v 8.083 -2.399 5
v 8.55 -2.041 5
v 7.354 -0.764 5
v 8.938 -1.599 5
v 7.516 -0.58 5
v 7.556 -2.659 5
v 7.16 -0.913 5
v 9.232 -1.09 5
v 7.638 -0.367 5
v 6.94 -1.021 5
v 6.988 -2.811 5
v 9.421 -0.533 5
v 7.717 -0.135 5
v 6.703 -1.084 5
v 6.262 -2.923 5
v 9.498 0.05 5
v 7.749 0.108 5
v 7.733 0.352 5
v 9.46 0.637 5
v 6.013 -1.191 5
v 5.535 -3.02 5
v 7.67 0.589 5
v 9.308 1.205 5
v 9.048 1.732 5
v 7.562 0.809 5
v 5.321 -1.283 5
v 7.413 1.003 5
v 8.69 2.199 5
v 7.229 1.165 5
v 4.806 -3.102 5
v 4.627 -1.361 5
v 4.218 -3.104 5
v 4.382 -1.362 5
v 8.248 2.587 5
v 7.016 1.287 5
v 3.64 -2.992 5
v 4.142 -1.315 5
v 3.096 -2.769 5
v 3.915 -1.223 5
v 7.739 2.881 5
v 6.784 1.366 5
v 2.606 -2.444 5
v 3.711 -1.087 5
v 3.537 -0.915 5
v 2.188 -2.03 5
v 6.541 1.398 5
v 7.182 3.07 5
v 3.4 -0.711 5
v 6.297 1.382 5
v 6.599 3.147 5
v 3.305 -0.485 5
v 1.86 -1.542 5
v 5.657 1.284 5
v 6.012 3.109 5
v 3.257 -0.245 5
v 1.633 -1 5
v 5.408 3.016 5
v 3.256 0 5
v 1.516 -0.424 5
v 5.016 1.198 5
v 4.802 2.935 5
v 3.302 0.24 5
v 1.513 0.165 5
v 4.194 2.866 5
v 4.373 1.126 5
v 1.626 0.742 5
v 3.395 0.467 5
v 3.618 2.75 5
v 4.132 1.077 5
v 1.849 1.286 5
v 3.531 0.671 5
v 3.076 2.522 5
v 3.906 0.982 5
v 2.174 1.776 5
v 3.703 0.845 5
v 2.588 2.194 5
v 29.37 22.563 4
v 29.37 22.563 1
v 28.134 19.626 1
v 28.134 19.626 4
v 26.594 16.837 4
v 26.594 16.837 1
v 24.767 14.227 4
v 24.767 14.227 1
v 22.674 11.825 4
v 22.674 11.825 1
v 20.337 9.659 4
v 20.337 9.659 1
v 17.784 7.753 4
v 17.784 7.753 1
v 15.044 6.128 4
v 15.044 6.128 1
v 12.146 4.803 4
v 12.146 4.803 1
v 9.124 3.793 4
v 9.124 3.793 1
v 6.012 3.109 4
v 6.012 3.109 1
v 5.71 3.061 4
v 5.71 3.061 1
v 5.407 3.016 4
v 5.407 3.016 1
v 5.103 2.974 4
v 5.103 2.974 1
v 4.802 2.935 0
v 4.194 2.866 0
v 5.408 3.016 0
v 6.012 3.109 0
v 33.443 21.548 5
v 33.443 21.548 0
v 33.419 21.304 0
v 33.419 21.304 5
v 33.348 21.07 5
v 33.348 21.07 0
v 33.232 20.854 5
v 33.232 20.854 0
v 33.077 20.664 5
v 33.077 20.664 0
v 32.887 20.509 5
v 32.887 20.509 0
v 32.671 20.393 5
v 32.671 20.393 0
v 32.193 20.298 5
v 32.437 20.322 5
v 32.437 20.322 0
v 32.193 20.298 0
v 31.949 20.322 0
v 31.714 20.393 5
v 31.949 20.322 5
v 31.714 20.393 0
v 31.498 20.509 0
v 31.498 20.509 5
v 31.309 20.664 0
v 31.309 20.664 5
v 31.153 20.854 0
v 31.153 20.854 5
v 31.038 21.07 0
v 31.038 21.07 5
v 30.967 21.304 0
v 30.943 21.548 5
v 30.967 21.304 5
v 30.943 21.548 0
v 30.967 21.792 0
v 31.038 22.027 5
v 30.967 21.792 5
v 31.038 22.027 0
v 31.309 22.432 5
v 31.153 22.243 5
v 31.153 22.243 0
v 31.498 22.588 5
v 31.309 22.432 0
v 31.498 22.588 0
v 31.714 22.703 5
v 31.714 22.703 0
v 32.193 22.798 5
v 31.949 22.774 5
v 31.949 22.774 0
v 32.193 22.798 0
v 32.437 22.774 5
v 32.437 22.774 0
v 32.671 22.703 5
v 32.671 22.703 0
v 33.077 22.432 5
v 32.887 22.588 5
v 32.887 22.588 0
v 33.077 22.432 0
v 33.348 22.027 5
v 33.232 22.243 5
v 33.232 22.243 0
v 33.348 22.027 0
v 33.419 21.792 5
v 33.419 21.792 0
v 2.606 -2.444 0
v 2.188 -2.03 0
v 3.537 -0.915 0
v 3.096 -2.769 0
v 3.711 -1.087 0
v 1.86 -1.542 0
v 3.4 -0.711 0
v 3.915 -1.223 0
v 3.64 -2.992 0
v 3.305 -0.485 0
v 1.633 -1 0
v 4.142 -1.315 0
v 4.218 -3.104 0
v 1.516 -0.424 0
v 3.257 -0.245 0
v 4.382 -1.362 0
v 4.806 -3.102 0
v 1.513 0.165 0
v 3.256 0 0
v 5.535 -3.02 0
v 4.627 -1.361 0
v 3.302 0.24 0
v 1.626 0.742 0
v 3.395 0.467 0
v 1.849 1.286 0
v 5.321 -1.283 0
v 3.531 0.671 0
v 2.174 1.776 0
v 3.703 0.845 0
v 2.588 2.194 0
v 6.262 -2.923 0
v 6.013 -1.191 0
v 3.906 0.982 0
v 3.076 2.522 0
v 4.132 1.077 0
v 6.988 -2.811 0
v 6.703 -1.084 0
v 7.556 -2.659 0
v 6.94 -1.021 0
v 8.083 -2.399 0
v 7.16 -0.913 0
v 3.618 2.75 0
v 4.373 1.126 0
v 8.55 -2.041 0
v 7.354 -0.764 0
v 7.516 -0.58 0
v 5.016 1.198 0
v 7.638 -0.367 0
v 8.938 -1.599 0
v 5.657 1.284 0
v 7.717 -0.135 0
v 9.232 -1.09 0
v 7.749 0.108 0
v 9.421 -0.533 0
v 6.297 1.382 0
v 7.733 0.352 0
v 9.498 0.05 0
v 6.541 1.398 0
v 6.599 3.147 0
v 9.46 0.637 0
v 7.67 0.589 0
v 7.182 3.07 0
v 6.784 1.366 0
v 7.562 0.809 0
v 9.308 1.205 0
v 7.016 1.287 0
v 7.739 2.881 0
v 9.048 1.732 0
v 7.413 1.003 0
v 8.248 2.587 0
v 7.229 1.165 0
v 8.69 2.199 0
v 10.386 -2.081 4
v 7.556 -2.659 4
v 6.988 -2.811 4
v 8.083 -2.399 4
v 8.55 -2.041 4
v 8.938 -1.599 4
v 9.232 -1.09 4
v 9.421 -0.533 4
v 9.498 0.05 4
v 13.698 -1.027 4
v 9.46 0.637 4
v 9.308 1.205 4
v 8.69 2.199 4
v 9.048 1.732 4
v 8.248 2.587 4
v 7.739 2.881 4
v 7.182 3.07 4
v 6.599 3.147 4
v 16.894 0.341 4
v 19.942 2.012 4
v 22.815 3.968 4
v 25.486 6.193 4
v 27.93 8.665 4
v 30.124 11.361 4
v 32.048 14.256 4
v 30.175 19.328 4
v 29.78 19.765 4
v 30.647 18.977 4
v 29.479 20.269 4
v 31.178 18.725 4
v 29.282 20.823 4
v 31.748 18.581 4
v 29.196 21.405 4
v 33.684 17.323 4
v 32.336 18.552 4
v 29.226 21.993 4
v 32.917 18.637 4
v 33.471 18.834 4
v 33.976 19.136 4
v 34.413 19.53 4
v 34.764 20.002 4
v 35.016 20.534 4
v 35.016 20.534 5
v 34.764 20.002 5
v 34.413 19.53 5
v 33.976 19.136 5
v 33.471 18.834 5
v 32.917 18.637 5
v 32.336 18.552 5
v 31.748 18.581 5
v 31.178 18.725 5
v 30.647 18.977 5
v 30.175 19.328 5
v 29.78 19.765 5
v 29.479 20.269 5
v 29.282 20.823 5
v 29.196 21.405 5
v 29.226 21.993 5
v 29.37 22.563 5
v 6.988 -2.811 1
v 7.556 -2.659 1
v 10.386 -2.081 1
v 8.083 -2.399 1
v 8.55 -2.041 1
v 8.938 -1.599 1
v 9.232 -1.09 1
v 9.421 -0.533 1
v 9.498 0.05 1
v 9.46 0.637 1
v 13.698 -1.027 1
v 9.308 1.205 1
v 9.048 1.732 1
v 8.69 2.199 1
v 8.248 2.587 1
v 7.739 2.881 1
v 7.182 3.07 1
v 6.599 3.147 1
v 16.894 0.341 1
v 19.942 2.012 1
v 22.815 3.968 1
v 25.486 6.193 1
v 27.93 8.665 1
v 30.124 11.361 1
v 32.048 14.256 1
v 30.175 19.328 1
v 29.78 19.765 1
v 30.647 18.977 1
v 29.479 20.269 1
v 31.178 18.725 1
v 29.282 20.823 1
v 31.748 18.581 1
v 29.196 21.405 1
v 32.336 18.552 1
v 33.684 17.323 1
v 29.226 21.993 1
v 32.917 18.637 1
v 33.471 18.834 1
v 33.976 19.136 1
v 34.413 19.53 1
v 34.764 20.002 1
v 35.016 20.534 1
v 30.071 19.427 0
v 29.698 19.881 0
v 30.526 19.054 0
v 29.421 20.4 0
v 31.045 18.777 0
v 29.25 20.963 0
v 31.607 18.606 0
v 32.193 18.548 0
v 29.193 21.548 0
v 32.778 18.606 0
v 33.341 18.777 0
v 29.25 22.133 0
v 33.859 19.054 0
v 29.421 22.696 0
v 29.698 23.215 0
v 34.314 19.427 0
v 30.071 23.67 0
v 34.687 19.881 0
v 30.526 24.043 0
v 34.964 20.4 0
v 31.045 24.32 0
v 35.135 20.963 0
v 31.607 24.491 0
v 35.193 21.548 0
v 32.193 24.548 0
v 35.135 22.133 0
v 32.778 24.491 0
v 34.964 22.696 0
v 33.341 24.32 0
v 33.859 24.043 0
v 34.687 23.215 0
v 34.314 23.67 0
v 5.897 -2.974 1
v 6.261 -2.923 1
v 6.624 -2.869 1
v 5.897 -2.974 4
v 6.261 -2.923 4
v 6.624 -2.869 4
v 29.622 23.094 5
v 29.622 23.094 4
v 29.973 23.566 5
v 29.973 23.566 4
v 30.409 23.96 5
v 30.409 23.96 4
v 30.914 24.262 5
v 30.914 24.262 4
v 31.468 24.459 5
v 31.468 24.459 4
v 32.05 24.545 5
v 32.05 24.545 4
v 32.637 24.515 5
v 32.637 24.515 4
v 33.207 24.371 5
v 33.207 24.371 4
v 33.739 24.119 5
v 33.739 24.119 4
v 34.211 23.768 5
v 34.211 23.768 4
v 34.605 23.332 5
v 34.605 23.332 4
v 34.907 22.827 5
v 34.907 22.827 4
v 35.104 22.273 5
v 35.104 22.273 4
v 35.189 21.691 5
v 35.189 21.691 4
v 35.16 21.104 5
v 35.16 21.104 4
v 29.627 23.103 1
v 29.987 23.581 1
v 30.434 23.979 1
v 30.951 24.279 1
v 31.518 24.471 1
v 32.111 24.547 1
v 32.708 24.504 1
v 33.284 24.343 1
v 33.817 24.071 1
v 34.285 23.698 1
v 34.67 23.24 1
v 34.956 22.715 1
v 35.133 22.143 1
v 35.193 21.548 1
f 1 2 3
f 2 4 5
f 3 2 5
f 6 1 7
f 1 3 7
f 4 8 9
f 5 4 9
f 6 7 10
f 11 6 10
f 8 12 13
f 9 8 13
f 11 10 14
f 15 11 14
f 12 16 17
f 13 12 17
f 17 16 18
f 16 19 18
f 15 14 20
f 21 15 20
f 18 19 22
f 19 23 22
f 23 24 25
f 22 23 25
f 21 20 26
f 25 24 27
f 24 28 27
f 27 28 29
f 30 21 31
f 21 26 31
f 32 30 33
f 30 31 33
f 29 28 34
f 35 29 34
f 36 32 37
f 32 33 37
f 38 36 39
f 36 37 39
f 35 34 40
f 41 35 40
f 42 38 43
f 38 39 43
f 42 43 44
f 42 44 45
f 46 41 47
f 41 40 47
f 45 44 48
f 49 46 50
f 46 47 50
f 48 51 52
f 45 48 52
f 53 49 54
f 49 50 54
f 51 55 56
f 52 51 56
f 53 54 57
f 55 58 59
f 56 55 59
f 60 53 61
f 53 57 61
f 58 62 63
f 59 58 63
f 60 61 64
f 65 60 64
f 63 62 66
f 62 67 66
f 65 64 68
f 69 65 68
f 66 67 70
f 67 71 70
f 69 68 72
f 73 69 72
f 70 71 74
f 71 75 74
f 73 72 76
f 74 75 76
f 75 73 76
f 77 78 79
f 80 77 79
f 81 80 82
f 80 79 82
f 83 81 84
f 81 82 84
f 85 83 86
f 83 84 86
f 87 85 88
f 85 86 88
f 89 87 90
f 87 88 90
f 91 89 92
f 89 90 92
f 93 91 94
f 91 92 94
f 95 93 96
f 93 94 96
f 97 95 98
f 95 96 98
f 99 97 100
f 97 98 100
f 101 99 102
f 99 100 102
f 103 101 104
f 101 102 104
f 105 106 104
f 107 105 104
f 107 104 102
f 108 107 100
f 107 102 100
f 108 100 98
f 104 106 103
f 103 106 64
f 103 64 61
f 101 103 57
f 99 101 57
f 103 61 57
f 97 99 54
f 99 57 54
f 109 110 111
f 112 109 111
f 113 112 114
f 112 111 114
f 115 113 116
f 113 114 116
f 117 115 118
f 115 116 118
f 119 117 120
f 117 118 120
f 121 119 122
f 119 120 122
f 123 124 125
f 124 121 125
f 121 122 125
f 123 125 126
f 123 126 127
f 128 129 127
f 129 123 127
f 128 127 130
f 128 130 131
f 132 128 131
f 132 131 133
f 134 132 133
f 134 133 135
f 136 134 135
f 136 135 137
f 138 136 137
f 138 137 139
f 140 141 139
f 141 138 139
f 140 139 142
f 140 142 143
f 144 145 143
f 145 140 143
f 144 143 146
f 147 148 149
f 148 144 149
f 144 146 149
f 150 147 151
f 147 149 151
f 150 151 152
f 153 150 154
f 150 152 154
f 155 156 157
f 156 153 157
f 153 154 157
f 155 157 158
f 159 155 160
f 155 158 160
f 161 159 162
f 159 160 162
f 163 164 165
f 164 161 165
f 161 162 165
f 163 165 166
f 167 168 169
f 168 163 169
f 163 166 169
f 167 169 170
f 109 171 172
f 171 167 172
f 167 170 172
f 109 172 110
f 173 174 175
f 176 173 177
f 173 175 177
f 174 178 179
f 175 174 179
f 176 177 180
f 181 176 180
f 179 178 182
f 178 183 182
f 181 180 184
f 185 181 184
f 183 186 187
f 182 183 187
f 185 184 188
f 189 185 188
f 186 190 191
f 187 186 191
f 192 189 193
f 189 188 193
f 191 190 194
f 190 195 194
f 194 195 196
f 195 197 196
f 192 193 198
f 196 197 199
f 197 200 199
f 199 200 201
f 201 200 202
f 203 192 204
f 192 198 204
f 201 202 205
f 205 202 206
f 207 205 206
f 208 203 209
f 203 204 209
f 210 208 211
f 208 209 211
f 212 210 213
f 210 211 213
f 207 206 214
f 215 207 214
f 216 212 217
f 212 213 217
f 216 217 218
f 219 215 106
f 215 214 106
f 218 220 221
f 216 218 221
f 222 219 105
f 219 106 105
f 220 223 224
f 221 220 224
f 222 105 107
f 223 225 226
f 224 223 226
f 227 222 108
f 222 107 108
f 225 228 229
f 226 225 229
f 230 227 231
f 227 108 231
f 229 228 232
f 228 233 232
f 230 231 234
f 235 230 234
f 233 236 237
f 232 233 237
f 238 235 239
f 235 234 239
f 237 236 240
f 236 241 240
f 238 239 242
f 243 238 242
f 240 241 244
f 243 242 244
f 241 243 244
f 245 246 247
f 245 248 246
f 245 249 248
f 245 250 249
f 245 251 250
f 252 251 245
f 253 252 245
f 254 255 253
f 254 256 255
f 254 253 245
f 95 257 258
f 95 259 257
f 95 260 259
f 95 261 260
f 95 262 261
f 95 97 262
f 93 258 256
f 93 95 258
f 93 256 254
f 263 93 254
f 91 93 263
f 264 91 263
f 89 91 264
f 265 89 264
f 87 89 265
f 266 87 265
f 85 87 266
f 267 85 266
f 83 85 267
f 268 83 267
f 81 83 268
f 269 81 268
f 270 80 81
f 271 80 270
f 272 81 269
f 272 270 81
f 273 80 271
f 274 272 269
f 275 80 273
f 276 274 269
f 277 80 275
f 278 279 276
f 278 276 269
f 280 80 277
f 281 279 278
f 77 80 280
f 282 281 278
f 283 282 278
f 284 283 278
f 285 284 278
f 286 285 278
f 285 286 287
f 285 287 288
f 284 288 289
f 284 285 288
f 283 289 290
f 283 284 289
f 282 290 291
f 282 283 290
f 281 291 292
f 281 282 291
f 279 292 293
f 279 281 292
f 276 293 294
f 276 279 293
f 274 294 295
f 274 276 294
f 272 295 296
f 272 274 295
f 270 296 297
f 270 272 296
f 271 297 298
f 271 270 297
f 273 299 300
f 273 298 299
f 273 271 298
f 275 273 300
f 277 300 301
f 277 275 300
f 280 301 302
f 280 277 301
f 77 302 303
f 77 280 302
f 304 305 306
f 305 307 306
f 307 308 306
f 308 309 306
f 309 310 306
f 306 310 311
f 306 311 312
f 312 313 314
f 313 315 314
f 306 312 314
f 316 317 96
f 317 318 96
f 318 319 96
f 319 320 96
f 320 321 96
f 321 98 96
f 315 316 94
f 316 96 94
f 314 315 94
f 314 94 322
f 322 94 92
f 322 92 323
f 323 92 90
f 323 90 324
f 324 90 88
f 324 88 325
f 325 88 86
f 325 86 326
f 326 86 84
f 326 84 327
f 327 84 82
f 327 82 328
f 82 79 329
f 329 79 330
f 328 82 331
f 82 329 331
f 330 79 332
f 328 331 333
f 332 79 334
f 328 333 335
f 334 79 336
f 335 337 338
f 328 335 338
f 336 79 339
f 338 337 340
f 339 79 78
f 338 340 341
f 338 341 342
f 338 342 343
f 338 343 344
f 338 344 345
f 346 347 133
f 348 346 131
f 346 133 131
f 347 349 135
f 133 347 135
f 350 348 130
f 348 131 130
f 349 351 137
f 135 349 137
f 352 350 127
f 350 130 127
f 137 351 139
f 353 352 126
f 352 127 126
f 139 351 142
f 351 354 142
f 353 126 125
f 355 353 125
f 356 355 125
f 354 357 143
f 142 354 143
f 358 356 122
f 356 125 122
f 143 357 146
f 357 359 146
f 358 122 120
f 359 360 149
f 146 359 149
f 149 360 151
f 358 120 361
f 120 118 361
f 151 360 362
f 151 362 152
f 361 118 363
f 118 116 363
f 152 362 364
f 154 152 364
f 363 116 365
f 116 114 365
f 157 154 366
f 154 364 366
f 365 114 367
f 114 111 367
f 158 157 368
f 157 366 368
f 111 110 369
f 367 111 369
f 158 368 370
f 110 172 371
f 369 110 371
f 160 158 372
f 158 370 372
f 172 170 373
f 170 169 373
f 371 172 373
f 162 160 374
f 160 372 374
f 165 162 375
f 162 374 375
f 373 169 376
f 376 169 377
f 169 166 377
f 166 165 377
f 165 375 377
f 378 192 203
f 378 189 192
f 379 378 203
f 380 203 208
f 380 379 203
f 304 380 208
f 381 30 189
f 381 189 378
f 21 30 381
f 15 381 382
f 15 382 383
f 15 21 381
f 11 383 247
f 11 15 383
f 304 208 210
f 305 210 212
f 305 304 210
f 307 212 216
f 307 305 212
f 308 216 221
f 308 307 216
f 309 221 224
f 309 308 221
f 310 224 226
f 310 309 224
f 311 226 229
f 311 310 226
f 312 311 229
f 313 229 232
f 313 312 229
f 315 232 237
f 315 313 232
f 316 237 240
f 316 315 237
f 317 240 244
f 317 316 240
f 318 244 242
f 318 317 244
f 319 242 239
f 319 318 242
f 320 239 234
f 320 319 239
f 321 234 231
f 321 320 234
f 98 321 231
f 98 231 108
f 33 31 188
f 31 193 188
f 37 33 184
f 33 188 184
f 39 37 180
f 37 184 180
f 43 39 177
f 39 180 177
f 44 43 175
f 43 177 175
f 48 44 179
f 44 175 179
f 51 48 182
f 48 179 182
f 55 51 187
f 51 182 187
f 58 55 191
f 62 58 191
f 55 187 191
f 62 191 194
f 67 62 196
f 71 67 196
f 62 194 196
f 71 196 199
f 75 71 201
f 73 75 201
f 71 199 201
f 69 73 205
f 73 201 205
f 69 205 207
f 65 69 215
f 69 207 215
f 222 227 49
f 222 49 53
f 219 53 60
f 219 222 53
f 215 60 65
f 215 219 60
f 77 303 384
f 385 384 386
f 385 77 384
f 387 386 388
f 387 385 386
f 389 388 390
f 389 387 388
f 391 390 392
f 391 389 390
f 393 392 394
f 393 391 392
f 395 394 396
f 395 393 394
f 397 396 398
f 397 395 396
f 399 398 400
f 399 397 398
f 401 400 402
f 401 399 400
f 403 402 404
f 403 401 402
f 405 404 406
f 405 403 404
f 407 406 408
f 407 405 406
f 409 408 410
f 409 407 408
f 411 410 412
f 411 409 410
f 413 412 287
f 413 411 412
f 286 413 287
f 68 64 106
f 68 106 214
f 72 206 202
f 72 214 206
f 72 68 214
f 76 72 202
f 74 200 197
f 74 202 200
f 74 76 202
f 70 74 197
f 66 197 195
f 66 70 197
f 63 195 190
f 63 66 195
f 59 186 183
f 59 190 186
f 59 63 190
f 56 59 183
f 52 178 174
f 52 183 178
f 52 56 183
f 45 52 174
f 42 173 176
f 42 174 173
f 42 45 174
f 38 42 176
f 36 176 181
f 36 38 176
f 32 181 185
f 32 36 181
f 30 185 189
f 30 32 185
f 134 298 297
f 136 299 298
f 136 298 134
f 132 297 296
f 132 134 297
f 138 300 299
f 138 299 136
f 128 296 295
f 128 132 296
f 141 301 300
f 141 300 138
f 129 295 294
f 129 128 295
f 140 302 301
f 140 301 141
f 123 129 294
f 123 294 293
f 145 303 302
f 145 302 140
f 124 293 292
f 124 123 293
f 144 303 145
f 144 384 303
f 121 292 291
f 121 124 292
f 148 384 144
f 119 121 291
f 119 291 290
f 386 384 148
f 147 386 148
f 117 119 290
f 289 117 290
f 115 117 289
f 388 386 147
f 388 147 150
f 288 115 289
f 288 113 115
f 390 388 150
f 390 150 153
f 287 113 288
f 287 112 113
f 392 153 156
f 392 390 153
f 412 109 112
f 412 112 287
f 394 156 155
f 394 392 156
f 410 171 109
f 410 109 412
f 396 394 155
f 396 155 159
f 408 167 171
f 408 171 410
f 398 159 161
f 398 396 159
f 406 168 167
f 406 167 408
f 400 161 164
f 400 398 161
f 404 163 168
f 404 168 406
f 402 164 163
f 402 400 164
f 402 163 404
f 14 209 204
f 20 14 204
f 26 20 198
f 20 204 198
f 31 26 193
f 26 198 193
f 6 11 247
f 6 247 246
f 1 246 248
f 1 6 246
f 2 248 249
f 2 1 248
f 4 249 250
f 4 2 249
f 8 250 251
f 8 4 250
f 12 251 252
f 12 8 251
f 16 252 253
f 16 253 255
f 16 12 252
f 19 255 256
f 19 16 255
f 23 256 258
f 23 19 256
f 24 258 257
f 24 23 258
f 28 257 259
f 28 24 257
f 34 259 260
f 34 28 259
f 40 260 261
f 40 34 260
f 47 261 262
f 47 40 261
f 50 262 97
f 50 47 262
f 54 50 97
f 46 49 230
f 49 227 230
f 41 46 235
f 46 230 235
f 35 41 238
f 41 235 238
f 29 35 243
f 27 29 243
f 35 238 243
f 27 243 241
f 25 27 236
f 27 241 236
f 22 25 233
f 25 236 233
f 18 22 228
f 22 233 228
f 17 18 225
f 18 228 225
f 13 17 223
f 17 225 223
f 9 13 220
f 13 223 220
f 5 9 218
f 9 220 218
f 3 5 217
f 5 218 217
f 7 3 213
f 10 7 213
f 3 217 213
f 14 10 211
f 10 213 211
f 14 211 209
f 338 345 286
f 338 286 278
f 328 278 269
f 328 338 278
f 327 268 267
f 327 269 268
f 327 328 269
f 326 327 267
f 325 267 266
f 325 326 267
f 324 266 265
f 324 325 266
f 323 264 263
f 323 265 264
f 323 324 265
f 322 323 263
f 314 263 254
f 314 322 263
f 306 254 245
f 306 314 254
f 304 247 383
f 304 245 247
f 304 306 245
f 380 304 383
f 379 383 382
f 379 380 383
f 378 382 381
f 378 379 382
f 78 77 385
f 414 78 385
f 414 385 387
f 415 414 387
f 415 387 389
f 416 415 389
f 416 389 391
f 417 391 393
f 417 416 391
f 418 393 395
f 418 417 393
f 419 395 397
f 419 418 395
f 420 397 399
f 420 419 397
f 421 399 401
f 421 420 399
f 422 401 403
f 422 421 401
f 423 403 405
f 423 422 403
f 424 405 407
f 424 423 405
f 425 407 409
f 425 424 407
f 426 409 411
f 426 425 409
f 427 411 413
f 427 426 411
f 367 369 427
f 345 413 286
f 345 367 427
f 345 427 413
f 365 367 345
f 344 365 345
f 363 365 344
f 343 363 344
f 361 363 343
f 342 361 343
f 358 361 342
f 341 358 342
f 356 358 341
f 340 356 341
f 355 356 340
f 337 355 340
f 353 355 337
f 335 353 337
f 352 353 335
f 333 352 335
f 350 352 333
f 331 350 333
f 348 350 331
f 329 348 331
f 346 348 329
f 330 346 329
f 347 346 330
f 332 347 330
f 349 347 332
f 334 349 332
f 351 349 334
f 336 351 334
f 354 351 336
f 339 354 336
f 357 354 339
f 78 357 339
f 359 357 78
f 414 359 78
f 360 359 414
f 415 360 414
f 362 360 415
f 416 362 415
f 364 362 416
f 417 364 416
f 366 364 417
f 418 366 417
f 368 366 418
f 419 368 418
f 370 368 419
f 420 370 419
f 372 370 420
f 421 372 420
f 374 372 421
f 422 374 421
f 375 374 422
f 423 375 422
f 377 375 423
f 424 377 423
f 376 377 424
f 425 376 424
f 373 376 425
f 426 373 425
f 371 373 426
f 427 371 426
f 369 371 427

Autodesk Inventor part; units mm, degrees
ref_plane "YZ Plane" through (0, 0, 0) normal (1, 0, 0) x (0, 1, 0)
ref_plane "XZ Plane" through (0, 0, 0) normal (0, 1, 0) x (-1, 0, 0)
ref_plane "XY Plane" through (0, 0, 0) normal (0, 0, 1) x (1, 0, 0)
sketch "Sketch1" plane through (0, 0, 0) normal (0, 0, 1) x (1, 0, 0)
  circle A0 centre (5.5, 0) radius 1.4795 projected
  circle A1 centre (32.1927, 21.5482) radius 1.25 projected
  circle A2 centre (5.5, 0) radius 3
  circle A3 centre (32.1927, 21.5482) radius 3
  point P0 (0, 0)
  dimension "d0" = 6
extrude "Extrusion1" add sketch "Sketch1" along normal blind 1
sketch "Sketch2" plane through (5.5, 0, 1) normal (0, 0, 1) x (1, 0, 0)
  circle A0 centre (0, 0) radius 3 projected
  circle A1 centre (0, 0) radius 1.4795 projected
  circle A2 centre (26.6927, 21.5482) radius 3 projected
  circle A3 centre (26.6927, 21.5482) radius 1.25 projected
  circle A4 centre (26.6927, 21.5482) radius 1.25 projected
  arc A5 (0, 0) -> (26.6927, 21.5482) centre (-4.3622, 32.7104) ccw construction
  arc A6 (0.3966, -2.9737) -> (29.5159, 20.5335) centre (-4.3622, 32.7104) ccw
  arc A7 (-0.3966, 2.9737) -> (23.8695, 22.563) centre (-4.3622, 32.7104) ccw
  arc A8 (-0.3966, 2.9737) -> (0.3966, -2.9737) centre (0, 0) ccw
  arc A9 (29.5159, 20.5335) -> (23.8695, 22.563) centre (26.6927, 21.5482) ccw
  circle A10 centre (19.7, 21.8678) radius 2.5 projected
  circle A11 centre (0, 0) radius 3 projected
  point P0 (-5.5, 0)
  point P1 (23.8695, 22.563)
  point P2 (-0.3966, 2.9737)
  point P3 (0.3966, -2.9737)
  point P4 (29.5159, 20.5335)
  dimension "d3" = 30
extrude "Extrusion2" add sketch "Sketch2" along normal blind 3 contours A0 | A0 A7 A2 A6 | A2
sketch "Sketch3" plane through (5.5, 0, 1) normal (0, 0, -1) x (-1, 0, 0)
  arc A0 (-29.5159, 20.5335) -> (-23.8695, 22.563) centre (-26.6927, 21.5482) ccw construction
  arc A1 (-29.5159, 20.5335) -> (-0.3966, -2.9737) centre (4.3622, 32.7104) ccw construction
  arc A2 (0.3966, 2.9737) -> (-0.3966, -2.9737) centre (0, 0) ccw construction
  arc A3 (-23.8695, 22.563) -> (0.3966, 2.9737) centre (4.3622, 32.7104) ccw construction
  circle A4 centre (0, 0) radius 3 construction
  circle A5 centre (0, 0) radius 1.4795 construction
  arc A6 (-1, 0.149) -> (1, -0.1179) centre (4.3622, 32.7104) ccw construction
  arc A7 (-1.4875, -2.8111) -> (0.6943, -3.1022) centre (4.3622, 32.7104) ccw
  arc A8 (-0.5125, 3.1091) -> (1.3057, 2.8665) centre (4.3622, 32.7104) ccw
  arc A9 (-0.5125, 3.1091) -> (-1.4875, -2.8111) centre (-1, 0.149) ccw
  arc A10 (0.6943, -3.1022) -> (1.3057, 2.8665) centre (1, -0.1179) ccw
  point P0 (5.5, 0)
  dimension "d6" = 1
  dimension "d7" = 1
extrude "Extrusion3" add sketch "Sketch3" along normal blind 1 and the other way blind 4
sketch "Sketch4" plane through (5.5, 0, 4) normal (0, 0, 1) x (1, 0, 0)
  arc A0 (29.5159, 20.5335) -> (23.8695, 22.563) centre (26.6927, 21.5482) ccw projected
  circle A1 centre (26.6927, 21.5482) radius 1.25 projected
  circle A2 centre (26.6927, 21.5482) radius 3 projected
  circle A3 centre (26.6927, 21.5482) radius 3
  point P0 (-5.5, 0)
extrude "Extrusion4" add sketch "Sketch4" along normal blind 1
sketch "Sketch5" plane through (0, 0, 0) normal (0, 0, -1) x (-1, 0, 0)
  arc A0 (-6.9875, -2.8111) -> (-4.8057, -3.1022) centre (-1.1378, 32.7104) ccw projected
  arc A1 (-4.8057, -3.1022) -> (-4.1943, 2.8665) centre (-4.5, -0.1179) ccw projected
  arc A2 (-6.0125, 3.1091) -> (-4.1943, 2.8665) centre (-1.1378, 32.7104) ccw projected
  arc A3 (-6.0125, 3.1091) -> (-6.9875, -2.8111) centre (-6.5, 0.149) ccw projected
  arc A4 (-6.5, 0.149) -> (-4.5, -0.1179) centre (-1.1378, 32.7104) ccw construction
  arc A5 (-6.7031, -1.0844) -> (-4.6274, -1.3614) centre (-1.1378, 32.7104) ccw
  arc A6 (-6.2969, 1.3824) -> (-4.3726, 1.1256) centre (-1.1378, 32.7104) ccw
  arc A7 (-6.2969, 1.3824) -> (-6.7031, -1.0844) centre (-6.5, 0.149) ccw
  arc A8 (-4.6274, -1.3614) -> (-4.3726, 1.1256) centre (-4.5, -0.1179) ccw
  arc A9 (-6.9875, -2.8111) -> (-4.8057, -3.1022) centre (-1.1378, 32.7104) ccw projected
  point P0 (0, 0)
  dimension "d14" = 2.5
extrude "Extrusion5" cut sketch "Sketch5" against normal blind 5 contours A7 A6 A8 A5
equation "\"d7\" = d6"
